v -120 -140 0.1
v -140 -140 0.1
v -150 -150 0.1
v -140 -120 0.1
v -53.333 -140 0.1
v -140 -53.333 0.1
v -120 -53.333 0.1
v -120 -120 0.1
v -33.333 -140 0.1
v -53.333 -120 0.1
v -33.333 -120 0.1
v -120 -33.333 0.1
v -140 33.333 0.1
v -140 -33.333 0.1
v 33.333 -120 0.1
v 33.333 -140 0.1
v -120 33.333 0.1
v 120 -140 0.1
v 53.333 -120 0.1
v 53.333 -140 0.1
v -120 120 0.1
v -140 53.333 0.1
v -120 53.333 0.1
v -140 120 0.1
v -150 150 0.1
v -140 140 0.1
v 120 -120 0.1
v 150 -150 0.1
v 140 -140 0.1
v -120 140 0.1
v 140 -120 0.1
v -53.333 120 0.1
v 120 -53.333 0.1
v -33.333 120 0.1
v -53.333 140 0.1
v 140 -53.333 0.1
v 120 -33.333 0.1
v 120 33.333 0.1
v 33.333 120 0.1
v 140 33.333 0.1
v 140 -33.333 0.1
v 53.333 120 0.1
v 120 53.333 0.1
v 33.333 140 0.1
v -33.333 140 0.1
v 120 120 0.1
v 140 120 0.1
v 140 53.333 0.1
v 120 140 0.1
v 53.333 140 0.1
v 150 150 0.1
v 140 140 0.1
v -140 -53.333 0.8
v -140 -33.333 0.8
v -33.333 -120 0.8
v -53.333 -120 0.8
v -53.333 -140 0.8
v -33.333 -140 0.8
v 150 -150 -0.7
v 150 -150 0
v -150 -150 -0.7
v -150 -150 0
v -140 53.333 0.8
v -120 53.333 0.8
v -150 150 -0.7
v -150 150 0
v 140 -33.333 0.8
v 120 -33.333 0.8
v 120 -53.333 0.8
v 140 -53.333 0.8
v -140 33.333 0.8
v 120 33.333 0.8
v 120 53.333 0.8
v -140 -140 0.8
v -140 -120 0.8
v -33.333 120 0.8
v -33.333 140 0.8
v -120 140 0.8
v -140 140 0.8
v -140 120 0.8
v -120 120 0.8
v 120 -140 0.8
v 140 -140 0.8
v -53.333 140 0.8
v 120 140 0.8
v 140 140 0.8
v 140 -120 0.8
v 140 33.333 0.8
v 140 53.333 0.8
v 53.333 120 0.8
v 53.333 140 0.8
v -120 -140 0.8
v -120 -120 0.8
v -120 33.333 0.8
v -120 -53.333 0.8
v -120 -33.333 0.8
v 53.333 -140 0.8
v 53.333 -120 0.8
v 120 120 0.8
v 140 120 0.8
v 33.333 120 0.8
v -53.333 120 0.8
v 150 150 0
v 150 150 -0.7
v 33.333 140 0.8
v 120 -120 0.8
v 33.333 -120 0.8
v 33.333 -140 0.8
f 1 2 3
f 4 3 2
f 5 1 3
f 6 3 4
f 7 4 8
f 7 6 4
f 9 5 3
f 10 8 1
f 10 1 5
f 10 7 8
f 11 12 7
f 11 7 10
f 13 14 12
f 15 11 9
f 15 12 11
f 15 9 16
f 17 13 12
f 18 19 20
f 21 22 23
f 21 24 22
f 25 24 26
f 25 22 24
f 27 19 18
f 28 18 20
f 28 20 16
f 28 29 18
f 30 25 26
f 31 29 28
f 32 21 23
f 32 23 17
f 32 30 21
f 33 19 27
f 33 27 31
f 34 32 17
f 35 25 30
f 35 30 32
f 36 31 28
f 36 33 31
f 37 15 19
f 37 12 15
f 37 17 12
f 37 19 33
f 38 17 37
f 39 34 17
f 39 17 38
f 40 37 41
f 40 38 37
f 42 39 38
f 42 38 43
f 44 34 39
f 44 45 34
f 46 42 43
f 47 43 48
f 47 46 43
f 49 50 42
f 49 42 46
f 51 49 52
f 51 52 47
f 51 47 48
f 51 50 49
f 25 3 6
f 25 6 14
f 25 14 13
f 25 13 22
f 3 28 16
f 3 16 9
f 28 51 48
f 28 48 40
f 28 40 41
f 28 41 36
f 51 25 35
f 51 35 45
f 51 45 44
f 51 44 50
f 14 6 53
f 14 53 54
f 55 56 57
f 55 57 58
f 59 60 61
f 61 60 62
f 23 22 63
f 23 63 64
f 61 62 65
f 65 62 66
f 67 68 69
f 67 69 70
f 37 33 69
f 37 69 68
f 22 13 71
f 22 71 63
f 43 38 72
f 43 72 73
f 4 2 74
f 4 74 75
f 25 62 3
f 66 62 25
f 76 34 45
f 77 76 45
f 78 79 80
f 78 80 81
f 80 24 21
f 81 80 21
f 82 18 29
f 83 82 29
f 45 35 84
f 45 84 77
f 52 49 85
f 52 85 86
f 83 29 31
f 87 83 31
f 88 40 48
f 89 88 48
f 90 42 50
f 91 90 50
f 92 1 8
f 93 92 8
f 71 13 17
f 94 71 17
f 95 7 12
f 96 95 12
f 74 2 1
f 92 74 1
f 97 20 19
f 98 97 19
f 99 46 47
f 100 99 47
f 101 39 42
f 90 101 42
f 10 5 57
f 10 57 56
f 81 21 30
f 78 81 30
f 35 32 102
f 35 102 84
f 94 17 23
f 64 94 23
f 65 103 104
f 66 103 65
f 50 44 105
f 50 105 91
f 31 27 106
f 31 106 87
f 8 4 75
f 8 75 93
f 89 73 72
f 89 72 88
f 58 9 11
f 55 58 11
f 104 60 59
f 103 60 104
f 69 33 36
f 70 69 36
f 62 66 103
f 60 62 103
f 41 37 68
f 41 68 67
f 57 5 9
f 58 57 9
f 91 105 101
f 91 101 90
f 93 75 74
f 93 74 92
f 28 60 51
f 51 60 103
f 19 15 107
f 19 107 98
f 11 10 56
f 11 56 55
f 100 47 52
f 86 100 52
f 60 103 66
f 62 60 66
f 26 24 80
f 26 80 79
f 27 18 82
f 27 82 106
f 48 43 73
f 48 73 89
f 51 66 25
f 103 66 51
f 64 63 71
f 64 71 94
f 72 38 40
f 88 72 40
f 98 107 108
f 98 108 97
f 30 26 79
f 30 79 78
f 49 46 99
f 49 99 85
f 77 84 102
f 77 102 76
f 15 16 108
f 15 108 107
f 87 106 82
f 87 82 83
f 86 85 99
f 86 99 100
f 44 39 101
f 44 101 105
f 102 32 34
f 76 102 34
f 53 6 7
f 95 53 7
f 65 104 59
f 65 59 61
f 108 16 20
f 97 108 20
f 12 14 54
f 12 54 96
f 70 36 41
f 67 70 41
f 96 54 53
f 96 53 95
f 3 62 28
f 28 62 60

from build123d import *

# Parameters (mm, degrees)
SKETCH_1_W      = 300
SKETCH_1_H      = 300
EXTRUDE_1_DEPTH = 0.1
SKETCH_2_W      = 20
SKETCH_2_H      = 20
EXTRUDE_2_DEPTH = 0.7
SKETCH_3_W      = 300
SKETCH_3_H      = 300
EXTRUDE_3_DEPTH = 0.7


with BuildPart() as part:
    # 스케치1 → 보스-돌출1 (new body)
    with BuildSketch(Plane.XY):
        Rectangle(SKETCH_1_W, SKETCH_1_H)
    extrude(amount=EXTRUDE_1_DEPTH)

    # 스케치2 → 보스-돌출2 (add)
    with BuildSketch(Plane.XY.offset(0.1)):
        with Locations((-43.333333333, 130)):
            Rectangle(SKETCH_2_W, SKETCH_2_H)
        with Locations((-130, 130)):
            Rectangle(SKETCH_2_W, SKETCH_2_H)
        with Locations((43.333333333, 130)):
            Rectangle(SKETCH_2_W, SKETCH_2_H)
        with Locations((130, 130)):
            Rectangle(SKETCH_2_W, SKETCH_2_H)
        with Locations((-130, 43.333333333)):
            Rectangle(SKETCH_2_W, SKETCH_2_H)
        with Locations((-130, -43.333333333)):
            Rectangle(SKETCH_2_W, SKETCH_2_H)
        with Locations((-130, -130)):
            Rectangle(SKETCH_2_W, SKETCH_2_H)
        with Locations((130, 43.333333333)):
            Rectangle(SKETCH_2_W, SKETCH_2_H)
        with Locations((130, -43.333333333)):
            Rectangle(SKETCH_2_W, SKETCH_2_H)
        with Locations((-43.333333333, -130)):
            Rectangle(SKETCH_2_W, SKETCH_2_H)
        with Locations((43.333333333, -130)):
            Rectangle(SKETCH_2_W, SKETCH_2_H)
        with Locations((130, -130)):
            Rectangle(SKETCH_2_W, SKETCH_2_H)
    extrude(amount=EXTRUDE_2_DEPTH)


with BuildPart() as body_2:
    # 스케치3 → 보스-돌출3 (new body)
    with BuildSketch(Plane(origin=(0, 0, 0), x_dir=(-1, 0, 0), z_dir=(0, 0, -1))):
        Rectangle(SKETCH_3_W, SKETCH_3_H)
    extrude(amount=EXTRUDE_3_DEPTH)


solid = Compound([part.part, body_2.part])
